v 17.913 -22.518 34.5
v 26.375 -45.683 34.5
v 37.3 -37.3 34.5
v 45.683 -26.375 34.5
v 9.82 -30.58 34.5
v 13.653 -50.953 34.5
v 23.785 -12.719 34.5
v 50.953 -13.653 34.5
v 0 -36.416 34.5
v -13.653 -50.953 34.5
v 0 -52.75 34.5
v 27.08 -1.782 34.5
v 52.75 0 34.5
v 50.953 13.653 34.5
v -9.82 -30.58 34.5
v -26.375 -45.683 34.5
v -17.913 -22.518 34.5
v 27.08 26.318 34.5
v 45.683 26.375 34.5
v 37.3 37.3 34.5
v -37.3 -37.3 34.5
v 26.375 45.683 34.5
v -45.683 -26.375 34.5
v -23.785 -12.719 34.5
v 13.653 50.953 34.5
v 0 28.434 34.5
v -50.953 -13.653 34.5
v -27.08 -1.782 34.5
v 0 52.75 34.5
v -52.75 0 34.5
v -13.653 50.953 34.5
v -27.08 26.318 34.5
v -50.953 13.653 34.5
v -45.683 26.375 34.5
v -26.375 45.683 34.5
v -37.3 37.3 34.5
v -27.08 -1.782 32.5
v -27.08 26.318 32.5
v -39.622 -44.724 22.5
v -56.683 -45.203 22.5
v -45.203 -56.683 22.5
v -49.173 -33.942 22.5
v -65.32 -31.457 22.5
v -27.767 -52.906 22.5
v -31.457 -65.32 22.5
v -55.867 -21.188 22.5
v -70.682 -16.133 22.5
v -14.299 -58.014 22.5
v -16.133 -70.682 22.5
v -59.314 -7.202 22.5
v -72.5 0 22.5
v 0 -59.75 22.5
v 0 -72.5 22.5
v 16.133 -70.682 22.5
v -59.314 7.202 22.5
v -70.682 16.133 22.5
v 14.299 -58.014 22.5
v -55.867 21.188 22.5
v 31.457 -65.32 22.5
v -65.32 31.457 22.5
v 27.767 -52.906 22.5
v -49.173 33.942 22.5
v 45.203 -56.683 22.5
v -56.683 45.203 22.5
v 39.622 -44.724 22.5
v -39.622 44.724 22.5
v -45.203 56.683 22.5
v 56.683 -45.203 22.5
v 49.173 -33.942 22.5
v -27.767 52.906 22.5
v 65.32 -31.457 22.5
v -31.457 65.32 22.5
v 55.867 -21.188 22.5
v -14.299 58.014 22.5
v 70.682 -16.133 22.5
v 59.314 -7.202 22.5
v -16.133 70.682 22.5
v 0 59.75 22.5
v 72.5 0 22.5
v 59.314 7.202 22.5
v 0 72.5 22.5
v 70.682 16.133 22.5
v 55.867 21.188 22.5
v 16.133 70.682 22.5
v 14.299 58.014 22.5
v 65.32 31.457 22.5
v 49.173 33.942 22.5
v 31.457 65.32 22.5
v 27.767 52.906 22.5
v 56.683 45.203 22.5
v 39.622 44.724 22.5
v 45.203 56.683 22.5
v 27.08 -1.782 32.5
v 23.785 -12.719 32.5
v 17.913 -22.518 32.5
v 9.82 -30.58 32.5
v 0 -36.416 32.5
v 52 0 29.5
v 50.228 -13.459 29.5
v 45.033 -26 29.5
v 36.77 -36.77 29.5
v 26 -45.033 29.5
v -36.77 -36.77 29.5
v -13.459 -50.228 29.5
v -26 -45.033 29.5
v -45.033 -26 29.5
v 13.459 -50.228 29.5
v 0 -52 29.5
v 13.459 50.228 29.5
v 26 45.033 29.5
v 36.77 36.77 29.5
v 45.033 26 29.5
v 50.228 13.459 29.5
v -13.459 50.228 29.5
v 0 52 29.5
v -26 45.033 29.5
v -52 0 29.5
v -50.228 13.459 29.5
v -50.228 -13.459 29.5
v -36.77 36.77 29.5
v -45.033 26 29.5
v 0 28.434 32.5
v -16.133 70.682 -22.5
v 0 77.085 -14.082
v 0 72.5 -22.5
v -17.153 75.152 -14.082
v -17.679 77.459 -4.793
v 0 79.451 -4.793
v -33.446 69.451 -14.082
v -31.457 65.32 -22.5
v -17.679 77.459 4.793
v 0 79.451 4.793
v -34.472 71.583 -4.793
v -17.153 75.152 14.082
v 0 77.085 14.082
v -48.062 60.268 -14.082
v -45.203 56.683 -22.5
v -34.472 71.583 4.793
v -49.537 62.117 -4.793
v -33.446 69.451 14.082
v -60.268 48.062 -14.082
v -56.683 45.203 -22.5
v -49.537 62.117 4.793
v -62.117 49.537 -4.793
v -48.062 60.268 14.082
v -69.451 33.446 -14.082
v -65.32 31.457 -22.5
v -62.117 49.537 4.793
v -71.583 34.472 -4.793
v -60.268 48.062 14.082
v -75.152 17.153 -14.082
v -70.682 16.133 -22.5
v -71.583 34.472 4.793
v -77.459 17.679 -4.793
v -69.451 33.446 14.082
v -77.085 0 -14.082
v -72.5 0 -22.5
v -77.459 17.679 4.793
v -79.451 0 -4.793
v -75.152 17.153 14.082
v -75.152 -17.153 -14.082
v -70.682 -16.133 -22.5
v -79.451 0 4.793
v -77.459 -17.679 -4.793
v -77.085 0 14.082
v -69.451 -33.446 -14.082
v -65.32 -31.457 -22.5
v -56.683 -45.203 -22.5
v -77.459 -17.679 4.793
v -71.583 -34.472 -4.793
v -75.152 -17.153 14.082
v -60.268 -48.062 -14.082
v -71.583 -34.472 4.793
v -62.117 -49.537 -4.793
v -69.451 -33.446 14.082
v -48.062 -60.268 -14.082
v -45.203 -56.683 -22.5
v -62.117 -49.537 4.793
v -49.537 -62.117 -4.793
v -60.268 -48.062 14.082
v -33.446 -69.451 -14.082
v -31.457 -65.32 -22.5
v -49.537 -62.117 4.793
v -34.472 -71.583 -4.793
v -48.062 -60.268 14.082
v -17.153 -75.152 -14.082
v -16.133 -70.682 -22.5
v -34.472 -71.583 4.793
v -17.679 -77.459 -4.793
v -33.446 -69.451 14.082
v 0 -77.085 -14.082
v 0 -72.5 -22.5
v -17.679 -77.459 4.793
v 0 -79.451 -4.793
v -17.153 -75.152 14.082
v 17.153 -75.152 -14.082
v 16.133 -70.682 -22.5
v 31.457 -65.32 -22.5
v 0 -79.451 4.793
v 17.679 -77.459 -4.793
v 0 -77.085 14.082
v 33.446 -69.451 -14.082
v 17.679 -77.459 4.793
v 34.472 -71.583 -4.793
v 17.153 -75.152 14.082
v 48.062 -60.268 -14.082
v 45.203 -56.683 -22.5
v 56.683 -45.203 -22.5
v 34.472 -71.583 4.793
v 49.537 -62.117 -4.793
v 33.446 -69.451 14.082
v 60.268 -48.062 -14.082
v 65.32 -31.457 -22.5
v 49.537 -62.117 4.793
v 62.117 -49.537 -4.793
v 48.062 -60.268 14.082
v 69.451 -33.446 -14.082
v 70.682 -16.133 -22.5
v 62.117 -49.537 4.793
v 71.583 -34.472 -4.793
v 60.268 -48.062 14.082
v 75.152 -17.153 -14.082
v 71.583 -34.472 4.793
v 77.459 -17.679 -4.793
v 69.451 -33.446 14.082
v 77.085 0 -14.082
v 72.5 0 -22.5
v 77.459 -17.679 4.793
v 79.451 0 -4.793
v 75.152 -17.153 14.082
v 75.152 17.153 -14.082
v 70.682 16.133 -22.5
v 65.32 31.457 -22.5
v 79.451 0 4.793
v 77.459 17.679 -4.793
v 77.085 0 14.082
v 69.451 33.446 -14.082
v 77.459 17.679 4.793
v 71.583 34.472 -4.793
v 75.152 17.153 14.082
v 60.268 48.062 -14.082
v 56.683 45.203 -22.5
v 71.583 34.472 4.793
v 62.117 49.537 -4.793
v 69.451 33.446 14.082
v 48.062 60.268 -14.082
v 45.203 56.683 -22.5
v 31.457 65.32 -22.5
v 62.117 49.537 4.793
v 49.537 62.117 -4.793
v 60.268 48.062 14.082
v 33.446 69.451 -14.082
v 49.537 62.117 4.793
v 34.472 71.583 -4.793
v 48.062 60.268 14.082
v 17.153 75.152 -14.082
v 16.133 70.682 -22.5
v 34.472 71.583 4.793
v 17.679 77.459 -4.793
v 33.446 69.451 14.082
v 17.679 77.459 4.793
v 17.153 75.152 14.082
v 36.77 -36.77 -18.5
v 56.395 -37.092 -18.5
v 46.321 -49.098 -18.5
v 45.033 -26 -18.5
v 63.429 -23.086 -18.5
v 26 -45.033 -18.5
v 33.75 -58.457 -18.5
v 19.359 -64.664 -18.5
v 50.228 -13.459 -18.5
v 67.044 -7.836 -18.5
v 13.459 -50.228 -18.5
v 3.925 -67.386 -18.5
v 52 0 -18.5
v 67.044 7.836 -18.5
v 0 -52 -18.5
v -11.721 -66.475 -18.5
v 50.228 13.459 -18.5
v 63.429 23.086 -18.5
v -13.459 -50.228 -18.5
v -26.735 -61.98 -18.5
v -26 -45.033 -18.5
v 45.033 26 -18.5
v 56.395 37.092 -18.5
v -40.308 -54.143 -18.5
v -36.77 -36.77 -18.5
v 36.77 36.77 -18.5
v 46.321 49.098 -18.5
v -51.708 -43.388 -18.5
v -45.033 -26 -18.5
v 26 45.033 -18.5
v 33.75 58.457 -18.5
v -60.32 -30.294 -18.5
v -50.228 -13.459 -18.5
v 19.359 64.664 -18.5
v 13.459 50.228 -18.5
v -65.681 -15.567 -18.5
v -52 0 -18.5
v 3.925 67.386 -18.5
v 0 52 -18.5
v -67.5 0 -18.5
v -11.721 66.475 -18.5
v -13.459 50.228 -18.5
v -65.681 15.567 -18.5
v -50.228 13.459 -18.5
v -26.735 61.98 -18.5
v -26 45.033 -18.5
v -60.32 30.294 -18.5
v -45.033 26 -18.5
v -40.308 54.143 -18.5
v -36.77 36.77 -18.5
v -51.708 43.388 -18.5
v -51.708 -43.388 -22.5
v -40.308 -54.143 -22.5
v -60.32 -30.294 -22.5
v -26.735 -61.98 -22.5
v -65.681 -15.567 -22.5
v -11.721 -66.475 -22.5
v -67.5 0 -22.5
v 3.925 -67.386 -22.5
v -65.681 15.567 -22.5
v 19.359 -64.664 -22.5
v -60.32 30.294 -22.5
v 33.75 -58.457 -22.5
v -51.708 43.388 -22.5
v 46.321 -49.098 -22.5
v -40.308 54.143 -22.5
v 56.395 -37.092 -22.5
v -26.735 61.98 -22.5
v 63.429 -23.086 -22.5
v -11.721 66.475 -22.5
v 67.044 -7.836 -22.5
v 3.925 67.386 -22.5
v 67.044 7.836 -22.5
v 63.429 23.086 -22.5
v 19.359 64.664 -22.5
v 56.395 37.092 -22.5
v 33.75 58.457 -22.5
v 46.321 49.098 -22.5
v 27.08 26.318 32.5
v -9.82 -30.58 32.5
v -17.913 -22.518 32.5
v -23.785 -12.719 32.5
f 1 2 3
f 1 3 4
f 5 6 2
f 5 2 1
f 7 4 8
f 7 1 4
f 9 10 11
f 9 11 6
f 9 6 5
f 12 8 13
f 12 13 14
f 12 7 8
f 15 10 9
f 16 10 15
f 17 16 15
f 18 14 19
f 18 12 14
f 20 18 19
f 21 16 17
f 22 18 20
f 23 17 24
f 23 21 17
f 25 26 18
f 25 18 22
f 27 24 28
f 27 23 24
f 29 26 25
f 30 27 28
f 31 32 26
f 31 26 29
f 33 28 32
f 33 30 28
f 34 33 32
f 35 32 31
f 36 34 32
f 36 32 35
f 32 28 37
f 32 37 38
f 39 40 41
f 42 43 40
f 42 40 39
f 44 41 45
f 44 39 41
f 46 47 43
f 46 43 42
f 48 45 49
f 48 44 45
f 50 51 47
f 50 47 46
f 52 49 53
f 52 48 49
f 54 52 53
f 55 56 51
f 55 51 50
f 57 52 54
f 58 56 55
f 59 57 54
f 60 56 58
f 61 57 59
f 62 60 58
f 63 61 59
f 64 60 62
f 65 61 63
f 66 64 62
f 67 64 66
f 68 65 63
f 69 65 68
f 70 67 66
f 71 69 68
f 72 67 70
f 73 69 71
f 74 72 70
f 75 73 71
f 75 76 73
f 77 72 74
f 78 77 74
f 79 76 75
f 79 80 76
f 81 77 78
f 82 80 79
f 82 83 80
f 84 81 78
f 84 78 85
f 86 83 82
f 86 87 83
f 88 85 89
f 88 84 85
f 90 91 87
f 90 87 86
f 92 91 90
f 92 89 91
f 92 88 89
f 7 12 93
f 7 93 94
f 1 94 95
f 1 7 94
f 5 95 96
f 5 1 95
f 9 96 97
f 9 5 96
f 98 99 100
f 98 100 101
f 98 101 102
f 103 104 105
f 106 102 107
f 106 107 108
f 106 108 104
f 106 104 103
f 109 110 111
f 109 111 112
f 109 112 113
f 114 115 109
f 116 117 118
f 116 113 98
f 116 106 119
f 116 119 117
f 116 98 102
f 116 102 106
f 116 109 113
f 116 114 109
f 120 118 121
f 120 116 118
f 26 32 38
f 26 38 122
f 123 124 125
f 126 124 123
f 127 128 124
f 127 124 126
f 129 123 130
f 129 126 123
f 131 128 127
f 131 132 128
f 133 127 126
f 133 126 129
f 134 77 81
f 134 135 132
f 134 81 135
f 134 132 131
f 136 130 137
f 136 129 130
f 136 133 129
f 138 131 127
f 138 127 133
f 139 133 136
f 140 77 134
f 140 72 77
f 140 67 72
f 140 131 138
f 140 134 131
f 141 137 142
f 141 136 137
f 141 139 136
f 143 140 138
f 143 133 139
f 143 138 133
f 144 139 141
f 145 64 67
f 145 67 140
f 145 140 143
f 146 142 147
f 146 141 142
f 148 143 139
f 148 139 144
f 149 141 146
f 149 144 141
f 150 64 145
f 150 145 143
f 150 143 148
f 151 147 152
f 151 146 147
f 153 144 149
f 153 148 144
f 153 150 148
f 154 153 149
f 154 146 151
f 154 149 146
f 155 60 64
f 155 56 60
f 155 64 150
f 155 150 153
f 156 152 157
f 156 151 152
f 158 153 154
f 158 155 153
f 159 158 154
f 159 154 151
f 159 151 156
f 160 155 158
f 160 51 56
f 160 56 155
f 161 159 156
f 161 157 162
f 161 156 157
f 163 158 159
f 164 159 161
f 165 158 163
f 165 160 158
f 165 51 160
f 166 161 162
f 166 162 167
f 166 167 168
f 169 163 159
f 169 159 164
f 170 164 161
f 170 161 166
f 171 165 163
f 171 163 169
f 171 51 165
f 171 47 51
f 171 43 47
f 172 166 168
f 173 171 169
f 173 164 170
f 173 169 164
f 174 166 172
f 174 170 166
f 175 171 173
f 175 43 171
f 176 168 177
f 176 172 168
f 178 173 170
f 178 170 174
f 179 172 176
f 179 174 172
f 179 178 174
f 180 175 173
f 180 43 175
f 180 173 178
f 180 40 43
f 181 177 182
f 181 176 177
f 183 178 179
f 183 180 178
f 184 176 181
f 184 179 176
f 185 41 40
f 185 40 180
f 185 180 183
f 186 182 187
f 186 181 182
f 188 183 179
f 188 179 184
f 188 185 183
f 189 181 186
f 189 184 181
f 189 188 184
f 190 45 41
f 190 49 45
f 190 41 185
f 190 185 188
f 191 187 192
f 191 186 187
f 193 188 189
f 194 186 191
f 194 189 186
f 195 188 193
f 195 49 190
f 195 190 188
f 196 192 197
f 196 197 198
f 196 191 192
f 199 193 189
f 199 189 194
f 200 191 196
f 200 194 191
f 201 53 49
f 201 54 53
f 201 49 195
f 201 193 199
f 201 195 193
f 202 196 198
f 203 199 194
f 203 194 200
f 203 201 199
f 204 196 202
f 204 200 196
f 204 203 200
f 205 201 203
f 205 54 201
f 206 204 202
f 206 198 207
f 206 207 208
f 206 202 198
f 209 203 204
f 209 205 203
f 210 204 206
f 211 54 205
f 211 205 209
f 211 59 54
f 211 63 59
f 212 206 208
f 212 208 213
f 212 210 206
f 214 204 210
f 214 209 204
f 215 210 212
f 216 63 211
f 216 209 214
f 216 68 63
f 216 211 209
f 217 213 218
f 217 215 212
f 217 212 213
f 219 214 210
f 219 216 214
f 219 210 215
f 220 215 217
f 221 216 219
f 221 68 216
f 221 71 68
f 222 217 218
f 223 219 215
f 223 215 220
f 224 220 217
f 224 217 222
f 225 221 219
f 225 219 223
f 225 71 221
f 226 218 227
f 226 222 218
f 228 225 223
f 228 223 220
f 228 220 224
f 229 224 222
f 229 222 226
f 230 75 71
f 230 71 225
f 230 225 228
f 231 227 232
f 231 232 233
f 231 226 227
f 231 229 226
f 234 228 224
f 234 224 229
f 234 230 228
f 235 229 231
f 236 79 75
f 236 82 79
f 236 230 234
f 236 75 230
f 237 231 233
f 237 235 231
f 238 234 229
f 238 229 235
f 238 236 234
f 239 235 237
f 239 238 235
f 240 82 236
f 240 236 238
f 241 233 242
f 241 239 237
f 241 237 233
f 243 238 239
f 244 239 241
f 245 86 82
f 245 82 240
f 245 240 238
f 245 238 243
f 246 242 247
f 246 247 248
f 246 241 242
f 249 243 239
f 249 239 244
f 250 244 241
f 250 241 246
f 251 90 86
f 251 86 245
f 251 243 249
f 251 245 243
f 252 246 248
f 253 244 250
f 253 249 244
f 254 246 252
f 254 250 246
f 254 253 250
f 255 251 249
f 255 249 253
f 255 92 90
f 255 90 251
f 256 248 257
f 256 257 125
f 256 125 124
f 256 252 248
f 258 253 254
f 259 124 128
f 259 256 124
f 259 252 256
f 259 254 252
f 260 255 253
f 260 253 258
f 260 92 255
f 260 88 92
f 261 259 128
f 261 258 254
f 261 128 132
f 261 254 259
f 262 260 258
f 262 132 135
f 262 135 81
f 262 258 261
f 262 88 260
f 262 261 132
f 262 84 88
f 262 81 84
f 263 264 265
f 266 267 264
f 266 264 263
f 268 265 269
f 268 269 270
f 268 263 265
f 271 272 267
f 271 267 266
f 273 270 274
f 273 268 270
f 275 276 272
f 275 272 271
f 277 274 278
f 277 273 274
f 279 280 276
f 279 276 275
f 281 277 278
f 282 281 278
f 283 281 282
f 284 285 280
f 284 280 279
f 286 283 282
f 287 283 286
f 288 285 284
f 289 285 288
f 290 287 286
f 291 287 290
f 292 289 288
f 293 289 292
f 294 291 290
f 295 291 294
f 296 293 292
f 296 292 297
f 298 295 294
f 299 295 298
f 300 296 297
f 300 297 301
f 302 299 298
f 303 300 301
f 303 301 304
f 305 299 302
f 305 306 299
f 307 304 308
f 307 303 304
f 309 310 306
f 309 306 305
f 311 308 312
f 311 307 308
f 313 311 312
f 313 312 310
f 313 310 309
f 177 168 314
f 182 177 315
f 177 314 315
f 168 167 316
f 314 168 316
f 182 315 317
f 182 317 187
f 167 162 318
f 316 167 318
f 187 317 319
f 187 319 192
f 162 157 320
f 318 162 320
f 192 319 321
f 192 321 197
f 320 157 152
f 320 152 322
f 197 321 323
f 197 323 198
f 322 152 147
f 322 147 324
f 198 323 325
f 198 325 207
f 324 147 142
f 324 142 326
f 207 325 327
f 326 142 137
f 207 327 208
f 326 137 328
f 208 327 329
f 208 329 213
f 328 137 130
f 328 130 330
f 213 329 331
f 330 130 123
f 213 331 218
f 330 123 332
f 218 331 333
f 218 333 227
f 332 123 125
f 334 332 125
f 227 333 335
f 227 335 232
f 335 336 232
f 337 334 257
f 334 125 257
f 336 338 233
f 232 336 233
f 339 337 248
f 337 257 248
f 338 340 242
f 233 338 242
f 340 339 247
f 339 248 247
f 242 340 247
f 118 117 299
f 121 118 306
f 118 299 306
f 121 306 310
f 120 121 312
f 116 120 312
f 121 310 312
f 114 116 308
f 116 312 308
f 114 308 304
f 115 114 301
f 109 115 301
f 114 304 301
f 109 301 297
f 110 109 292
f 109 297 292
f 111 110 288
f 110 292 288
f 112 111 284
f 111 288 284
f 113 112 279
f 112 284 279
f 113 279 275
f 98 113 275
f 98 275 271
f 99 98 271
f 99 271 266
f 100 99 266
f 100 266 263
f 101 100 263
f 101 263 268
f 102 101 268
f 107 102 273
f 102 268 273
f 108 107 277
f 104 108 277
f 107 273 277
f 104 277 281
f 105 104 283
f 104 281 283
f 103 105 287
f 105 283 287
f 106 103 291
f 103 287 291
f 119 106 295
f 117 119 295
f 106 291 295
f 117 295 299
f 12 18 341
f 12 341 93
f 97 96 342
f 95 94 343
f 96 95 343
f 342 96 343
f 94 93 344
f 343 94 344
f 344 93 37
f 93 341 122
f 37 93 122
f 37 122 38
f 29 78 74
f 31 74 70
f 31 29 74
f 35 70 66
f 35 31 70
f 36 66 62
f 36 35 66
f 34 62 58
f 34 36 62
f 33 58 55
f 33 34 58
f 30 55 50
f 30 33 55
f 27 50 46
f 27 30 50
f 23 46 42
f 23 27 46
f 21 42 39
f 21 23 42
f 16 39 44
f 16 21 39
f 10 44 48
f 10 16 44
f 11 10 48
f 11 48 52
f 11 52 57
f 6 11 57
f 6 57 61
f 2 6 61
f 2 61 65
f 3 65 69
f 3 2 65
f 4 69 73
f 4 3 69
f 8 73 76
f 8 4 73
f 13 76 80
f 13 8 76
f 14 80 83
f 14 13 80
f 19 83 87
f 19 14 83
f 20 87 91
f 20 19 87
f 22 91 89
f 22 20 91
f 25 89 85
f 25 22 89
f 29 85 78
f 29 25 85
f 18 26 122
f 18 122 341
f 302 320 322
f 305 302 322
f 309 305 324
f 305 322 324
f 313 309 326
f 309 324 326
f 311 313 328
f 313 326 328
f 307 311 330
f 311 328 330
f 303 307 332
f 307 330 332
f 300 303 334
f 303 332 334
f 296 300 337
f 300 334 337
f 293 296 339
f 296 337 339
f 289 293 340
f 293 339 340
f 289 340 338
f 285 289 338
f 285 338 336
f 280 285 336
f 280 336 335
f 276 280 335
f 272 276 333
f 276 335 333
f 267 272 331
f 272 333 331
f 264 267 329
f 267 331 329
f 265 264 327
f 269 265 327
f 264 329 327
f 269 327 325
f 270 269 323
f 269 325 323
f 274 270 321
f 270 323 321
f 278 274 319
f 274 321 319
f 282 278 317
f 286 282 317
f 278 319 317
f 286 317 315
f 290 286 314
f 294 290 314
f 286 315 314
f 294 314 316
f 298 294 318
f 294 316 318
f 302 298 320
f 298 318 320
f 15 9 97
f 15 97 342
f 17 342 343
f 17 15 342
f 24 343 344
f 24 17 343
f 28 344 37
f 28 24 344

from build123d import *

# Parameters (mm, degrees)
EXTRUDE_1_DEPTH      = 22.5
EXTRUDE_1_DEPTH_BACK = 22.5
SKETCH_1_R           = 82.5
SKETCH_4_R           = 67.5
CUT_EXTRUDE_1_DEPTH  = 4
SKETCH_5_R           = 52
CUT_EXTRUDE_2_DEPTH  = 48
CUT_EXTRUDE_3_DEPTH  = 2


with BuildPart() as part:
    # Эскиз1 → Бобышка-Вытянуть1 (new, two sides: drawn at the far end of the back side and taken through both)
    with BuildSketch(Plane.XY.offset(-EXTRUDE_1_DEPTH_BACK)):
        Circle(SKETCH_1_R)
    extrude(amount=EXTRUDE_1_DEPTH + EXTRUDE_1_DEPTH_BACK)

    # Эскиз3 → Повернуть1 (revolve)
    with BuildSketch(Plane(origin=(0, 0, 0), x_dir=(0, 0, -1), z_dir=(1, 0, 0))):
        Polygon((-22.5, 0), (-22.5, 59.75), (-34.5, 52.75), (-34.5, 0), align=None)
    revolve(axis=Axis((0, 0, -22.110804518), (0, 0, 1)))

    # Эскиз4 → Вырез-Вытянуть1 (cut)
    with BuildSketch(Plane(origin=(0, 0, -22.5), x_dir=(-1, 0, 0), z_dir=(0, 0, -1))):
        Circle(SKETCH_4_R)
    extrude(amount=-CUT_EXTRUDE_1_DEPTH, mode=Mode.SUBTRACT)

    # Эскиз5 → Вырез-Вытянуть2 (cut)
    with BuildSketch(Plane(origin=(0, 0, -18.5), x_dir=(-1, 0, 0), z_dir=(0, 0, -1))):
        Circle(SKETCH_5_R)
    extrude(amount=-CUT_EXTRUDE_2_DEPTH, mode=Mode.SUBTRACT)

    # Эскиз7 → Вырез-Повернуть1 (revolve, cut)
    with BuildSketch(Plane(origin=(0, 0, 0), x_dir=(0, 0, -1), z_dir=(1, 0, 0))):
        with BuildLine():
            Line((-22.5, 72.5), (-31.948658462, 72.5))
            Line((-31.948658462, 72.5), (-31.948658462, 102.607455118))
            Line((-31.948658462, 102.607455118), (33.489916399, 102.607455118))
            Line((33.489916399, 102.607455118), (33.489916399, 72.5))
            Line((33.489916399, 72.5), (22.5, 72.5))
            ThreePointArc((22.5, 72.5), (0, 79.75), (-22.5, 72.5))
        make_face()
    revolve(axis=Axis((0, 0, 0), (0, 0, 1)), mode=Mode.SUBTRACT)

    # Эскиз8 → Вырез-Вытянуть3 (cut)
    with BuildSketch(Plane.XY.offset(34.5)):
        with BuildLine():
            Line((-27.080041081, 26.318414926), (0, 28.434043135))
            Line((0, 28.434043135), (27.080041081, 26.318414926))
            Line((27.080041081, 26.318414926), (27.080041081, -1.78158165))
            ThreePointArc((27.080041081, -1.78158165), (17.912944533, -22.517713966), (0, -36.415528927))
            ThreePointArc((0, -36.415528927), (-17.912944533, -22.517713966), (-27.080041081, -1.78158165))
            Line((-27.080041081, -1.78158165), (-27.080041081, 26.318414926))
        make_face()
    extrude(amount=-CUT_EXTRUDE_3_DEPTH, mode=Mode.SUBTRACT)


solid = part.part
